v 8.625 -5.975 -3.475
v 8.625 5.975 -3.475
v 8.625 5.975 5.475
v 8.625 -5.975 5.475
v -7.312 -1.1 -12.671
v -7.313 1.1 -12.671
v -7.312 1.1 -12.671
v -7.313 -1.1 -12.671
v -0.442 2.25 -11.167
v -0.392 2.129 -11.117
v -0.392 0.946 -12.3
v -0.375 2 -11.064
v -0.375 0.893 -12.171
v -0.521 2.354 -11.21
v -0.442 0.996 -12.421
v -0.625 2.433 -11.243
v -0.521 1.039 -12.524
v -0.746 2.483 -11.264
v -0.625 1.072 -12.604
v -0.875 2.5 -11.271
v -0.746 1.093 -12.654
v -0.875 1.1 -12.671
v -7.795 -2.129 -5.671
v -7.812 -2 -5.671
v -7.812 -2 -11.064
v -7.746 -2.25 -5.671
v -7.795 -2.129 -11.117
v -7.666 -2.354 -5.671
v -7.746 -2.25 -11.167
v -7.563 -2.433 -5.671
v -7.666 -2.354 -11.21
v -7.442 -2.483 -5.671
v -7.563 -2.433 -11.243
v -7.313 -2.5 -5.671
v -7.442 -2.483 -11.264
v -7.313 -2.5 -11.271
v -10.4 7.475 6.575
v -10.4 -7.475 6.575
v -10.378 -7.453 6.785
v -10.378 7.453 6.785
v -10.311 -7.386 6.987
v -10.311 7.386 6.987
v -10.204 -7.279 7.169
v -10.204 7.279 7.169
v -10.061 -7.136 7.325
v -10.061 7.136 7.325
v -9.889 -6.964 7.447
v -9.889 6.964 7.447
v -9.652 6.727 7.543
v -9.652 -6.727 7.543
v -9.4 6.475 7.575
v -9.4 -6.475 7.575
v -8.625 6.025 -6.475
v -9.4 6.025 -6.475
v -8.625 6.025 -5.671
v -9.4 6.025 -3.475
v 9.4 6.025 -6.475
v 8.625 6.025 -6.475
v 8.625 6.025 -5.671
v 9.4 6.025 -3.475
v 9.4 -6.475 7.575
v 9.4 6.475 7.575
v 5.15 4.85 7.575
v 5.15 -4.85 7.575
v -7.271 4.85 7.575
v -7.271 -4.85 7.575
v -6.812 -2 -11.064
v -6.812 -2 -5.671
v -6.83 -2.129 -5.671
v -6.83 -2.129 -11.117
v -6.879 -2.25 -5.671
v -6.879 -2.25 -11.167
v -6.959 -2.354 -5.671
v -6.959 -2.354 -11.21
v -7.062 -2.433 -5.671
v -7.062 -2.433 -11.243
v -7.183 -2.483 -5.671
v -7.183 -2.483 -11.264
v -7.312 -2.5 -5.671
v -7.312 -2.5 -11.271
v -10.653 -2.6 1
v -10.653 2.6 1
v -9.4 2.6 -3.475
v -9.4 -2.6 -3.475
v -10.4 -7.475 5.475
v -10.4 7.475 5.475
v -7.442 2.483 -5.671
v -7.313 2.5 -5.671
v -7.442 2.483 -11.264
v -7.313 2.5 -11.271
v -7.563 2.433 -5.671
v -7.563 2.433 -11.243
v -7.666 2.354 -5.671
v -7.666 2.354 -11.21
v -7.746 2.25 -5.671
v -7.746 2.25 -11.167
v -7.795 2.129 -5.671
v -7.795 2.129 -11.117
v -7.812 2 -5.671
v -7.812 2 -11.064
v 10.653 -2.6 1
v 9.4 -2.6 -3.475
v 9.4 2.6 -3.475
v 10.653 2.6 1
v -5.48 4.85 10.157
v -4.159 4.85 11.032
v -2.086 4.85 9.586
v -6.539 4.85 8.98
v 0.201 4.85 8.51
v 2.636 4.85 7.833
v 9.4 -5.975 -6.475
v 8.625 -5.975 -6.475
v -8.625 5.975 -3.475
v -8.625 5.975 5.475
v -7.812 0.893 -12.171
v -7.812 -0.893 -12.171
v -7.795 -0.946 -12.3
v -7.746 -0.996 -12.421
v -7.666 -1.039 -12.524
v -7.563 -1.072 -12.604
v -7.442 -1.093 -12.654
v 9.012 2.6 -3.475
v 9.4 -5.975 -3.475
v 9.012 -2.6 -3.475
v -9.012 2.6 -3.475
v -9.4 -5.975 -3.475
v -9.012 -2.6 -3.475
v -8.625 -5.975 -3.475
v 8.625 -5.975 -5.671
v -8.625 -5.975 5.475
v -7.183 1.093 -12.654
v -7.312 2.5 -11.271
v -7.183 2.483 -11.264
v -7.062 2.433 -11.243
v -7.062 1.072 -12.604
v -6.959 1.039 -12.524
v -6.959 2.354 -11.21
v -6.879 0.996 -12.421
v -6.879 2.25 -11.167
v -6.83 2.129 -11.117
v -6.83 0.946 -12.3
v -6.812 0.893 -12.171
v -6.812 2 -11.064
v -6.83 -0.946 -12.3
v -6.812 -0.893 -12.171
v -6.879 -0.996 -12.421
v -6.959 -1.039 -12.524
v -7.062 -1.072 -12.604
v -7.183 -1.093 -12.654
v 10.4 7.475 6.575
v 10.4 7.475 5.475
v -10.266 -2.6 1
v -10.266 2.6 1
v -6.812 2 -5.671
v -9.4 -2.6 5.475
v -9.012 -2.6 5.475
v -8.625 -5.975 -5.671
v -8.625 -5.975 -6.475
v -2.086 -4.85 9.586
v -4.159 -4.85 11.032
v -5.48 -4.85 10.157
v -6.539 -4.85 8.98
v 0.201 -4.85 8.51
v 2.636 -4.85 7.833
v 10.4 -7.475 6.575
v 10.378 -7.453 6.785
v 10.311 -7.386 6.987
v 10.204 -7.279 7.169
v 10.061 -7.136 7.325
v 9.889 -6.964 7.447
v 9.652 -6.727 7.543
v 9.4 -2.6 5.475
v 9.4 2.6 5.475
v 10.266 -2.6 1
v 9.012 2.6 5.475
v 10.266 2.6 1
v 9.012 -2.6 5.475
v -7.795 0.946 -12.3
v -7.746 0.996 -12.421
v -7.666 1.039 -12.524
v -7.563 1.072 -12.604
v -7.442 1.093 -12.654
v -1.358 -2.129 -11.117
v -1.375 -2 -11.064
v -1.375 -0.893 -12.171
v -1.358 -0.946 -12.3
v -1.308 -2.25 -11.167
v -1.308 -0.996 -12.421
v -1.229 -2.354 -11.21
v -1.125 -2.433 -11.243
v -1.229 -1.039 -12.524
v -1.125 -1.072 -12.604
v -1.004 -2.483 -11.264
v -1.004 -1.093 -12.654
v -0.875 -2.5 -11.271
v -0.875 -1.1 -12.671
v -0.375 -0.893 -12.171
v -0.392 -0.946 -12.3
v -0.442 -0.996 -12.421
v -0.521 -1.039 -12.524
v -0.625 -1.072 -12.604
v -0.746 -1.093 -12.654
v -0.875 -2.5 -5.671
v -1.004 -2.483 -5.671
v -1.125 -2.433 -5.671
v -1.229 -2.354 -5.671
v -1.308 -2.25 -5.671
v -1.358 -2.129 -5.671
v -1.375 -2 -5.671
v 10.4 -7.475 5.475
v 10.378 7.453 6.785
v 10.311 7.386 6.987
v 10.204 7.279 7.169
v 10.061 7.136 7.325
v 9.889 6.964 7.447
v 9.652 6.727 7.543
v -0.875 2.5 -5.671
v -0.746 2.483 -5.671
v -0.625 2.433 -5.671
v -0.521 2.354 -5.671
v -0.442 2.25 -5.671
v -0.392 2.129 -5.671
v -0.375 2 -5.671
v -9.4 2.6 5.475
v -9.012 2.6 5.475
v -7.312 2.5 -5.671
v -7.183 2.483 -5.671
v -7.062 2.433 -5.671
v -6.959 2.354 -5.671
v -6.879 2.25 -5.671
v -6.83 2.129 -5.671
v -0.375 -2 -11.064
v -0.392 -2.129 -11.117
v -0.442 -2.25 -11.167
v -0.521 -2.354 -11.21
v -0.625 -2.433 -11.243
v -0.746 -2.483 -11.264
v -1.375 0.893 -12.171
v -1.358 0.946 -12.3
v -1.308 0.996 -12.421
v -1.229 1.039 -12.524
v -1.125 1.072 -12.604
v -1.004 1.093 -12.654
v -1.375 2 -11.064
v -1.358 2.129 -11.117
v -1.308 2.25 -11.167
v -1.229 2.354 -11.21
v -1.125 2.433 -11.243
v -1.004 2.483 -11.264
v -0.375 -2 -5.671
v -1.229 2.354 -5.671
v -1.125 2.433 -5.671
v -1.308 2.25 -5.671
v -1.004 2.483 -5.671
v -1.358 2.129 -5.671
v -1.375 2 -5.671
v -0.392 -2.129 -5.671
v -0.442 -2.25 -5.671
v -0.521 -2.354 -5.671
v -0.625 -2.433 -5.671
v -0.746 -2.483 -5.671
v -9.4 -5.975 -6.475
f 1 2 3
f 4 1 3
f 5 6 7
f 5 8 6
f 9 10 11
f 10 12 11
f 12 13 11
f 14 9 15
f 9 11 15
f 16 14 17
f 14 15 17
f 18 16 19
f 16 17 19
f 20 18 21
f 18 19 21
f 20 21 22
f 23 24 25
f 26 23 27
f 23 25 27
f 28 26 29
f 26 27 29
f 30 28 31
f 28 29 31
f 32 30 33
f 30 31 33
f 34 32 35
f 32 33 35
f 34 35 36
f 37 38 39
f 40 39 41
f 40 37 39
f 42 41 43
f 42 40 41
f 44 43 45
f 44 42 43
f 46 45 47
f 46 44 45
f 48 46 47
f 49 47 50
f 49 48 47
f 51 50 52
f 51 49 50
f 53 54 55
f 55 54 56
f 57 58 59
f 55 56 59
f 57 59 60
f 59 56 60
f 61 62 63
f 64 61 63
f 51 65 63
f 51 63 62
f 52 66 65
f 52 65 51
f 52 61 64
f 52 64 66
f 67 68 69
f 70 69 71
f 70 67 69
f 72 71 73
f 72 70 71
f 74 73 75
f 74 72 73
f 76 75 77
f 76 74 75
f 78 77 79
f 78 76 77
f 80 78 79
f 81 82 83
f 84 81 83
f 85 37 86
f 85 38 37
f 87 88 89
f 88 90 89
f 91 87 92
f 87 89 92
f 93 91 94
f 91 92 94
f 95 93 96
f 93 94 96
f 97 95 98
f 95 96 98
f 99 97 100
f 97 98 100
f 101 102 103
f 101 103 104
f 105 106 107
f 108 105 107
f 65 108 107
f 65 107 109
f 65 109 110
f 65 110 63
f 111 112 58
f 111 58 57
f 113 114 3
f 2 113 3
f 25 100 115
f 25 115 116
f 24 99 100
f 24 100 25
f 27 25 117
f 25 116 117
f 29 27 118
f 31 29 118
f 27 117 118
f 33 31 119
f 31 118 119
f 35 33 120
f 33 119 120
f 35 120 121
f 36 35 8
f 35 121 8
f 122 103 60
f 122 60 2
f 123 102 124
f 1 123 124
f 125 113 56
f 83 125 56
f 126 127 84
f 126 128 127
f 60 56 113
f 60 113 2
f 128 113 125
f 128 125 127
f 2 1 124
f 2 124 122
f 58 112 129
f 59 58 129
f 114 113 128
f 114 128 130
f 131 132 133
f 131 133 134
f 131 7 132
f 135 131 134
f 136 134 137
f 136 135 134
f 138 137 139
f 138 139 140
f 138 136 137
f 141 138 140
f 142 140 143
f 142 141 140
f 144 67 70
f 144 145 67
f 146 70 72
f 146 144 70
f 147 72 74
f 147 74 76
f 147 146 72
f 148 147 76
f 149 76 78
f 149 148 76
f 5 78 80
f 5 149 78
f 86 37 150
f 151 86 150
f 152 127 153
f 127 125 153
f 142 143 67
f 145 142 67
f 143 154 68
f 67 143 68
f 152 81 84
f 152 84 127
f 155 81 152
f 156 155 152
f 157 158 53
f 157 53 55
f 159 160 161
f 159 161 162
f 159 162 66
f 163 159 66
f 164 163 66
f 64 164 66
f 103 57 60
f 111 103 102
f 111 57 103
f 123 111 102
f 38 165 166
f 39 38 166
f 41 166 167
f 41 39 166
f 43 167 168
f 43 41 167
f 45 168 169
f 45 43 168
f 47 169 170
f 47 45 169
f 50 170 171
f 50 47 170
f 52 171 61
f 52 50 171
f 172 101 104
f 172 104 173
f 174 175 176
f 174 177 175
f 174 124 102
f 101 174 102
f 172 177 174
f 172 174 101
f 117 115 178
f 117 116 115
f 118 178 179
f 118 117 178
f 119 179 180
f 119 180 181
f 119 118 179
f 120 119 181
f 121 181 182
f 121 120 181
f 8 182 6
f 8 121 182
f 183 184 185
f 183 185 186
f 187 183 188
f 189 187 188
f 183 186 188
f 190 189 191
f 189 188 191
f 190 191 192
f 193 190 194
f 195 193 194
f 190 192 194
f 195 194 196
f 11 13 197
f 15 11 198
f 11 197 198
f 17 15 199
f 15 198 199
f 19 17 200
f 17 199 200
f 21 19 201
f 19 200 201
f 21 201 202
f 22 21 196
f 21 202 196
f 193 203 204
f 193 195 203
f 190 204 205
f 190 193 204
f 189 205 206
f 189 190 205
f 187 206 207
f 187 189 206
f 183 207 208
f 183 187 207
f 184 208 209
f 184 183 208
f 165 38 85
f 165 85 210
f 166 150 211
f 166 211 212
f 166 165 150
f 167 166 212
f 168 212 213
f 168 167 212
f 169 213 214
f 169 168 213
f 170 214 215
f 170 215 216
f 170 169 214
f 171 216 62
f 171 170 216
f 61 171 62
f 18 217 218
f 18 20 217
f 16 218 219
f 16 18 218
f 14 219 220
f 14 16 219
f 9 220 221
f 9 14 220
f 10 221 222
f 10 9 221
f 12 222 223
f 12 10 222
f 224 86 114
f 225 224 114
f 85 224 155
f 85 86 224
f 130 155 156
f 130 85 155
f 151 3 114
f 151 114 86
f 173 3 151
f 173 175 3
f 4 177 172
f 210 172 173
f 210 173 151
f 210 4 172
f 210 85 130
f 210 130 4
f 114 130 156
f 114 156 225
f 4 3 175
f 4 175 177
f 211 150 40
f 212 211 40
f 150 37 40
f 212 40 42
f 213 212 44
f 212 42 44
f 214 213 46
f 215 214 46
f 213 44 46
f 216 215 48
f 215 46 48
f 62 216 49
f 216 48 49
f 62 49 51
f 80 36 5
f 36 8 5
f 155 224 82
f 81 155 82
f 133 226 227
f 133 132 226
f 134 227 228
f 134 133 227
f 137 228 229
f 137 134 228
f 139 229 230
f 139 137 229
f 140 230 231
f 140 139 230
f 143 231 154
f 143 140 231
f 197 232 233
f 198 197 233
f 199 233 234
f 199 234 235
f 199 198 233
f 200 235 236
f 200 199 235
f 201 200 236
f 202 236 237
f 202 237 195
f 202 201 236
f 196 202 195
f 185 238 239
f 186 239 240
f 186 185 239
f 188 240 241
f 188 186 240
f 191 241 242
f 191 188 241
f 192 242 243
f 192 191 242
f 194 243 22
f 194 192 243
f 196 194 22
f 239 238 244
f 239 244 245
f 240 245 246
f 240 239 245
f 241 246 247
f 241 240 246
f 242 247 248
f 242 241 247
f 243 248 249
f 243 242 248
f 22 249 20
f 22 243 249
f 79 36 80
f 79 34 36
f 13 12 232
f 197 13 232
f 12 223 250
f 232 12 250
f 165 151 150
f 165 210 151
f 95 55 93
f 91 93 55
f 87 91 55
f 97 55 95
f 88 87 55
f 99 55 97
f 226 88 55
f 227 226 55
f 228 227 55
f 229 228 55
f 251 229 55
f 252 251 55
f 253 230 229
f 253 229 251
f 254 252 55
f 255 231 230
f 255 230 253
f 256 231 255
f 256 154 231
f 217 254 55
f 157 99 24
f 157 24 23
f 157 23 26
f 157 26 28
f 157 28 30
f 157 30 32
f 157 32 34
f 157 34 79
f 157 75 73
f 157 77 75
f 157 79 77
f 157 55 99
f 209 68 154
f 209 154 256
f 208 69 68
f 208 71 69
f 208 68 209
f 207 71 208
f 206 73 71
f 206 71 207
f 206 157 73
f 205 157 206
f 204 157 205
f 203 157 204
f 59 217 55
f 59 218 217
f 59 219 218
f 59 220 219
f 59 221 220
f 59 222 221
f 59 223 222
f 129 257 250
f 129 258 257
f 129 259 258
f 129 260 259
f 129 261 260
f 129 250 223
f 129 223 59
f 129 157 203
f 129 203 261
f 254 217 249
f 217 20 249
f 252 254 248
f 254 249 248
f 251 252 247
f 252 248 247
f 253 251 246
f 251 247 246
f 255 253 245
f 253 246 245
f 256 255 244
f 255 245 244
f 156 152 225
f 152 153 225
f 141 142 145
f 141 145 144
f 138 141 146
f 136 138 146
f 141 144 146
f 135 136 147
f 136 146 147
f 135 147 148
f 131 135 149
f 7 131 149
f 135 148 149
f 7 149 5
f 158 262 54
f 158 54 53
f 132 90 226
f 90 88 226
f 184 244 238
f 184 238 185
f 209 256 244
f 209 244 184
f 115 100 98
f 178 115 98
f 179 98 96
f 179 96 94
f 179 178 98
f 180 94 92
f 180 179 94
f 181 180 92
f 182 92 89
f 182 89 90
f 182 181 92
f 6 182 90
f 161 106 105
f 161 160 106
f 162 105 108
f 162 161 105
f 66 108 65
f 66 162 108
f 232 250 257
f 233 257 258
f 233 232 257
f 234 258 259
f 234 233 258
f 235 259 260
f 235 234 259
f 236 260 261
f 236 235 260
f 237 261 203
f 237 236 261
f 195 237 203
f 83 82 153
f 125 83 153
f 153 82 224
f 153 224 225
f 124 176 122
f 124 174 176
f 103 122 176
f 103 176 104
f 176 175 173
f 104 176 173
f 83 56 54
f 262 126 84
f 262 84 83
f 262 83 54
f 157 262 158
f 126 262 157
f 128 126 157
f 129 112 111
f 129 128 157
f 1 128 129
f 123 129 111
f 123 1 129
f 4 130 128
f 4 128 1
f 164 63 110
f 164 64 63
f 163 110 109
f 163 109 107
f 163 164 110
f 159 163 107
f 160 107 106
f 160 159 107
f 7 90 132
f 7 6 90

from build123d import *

# Parameters (mm, degrees)
F0_W      = 17.25
F0_H      = 10.95
F1_DEPTH  = 5.975
F3_DEPTH  = 12
F4_W      = 17.25
F4_H      = 0.8041968666
F5_DEPTH  = 12.001
F7_DEPTH  = 2.6
F9_DEPTH  = 7.475
F10_W     = 1
F10_H     = 5
F11_DEPTH = 7
F12_SIZE  = 1.4
F13_R     = 0.49999
F14_R     = 1
F16_DEPTH = 4.85


# Not quite as in the source:
# - a fillet or chamfer is up to 0.001 mm smaller than in the source, because OpenCascade refuses the exact size


with BuildPart() as f1:
    # F0 (on Front) → F1 (new body, symmetric)
    with BuildSketch(Plane.XZ):
        Rectangle(F0_W, F0_H)
    extrude(amount=F1_DEPTH, both=True)

    # F2 (on face) → F3 (join)
    with BuildSketch(Plane.XZ.offset(5.975)):
        Polygon((-8.625, -5.475), (8.625, -5.475), (8.625, -3.475), (0, -3.475), (-8.625, -3.475), align=None)
        Polygon((8.625, -3.475), (8.625, -5.475), (-8.625, -5.475), (-8.625, -3.475), (-9.4, -3.475), (-9.4, -6.475), (0, -6.475), (9.4, -6.475), (9.4, -3.475), align=None)
    extrude(amount=-F3_DEPTH)

    # F4 (on face) → F5 (cut, through all)
    with BuildSketch(Plane.XZ.offset(5.975)):
        with Locations((0, -6.0729015667)):
            Rectangle(F4_W, F4_H)
    extrude(amount=-F5_DEPTH, mode=Mode.SUBTRACT)

    # F6 (on Front) → F7 (join, symmetric)
    with BuildSketch(Plane.XZ):
        Polygon((-10.653115809, 1), (-9.4, -3.475), (-9.0125, -3.475), (-10.265615809, 1), (-9.0125, 5.475), (-9.4, 5.475), align=None)
        Polygon((10.265615809, 1), (9.0125, -3.475), (9.4, -3.475), (10.653115809, 1), (9.4, 5.475), (9.0125, 5.475), align=None)
    extrude(amount=F7_DEPTH, both=True)

    # F8 (on Front) → F9 (join, symmetric)
    with BuildSketch(Plane.XZ):
        Polygon((-10.4, 5.475), (-8.625, 5.475), (8.625, 5.475), (10.4, 5.475), (10.4, 7.575), (-10.4, 7.575), align=None)
    extrude(amount=F9_DEPTH, both=True)

    # F10 (on face) → F11 (join)
    with BuildSketch(Plane(origin=(0, 0, -5.6708031334), x_dir=(1, 0, 0), z_dir=(0, 0, -1))):
        with Locations((-7.3124970421, 0)):
            Rectangle(F10_W, F10_H)
        with Locations((-0.875, 0)):
            Rectangle(F10_W, F10_H)
    extrude(amount=F11_DEPTH)

    # F12
    f12_edges = [f1.edges().sort_by_distance(p)[0] for p in [
        (-7.312497, -2.5, -12.670803),
        (-7.312497, 2.5, -12.670803),
        (-0.875, -2.5, -12.670803),
        (-0.875, 2.5, -12.670803),
    ]]
    chamfer(f12_edges, length=F12_SIZE)

    # F13 (radius 0.5 in the source; OpenCascade refuses exactly that, so slightly less here)
    f13_edges = [f1.edges().sort_by_distance(p)[0] for p in [
        (-6.812497, -2.5, -8.470803),
        (-7.812497, -2.5, -8.470803),
        (-6.812497, -1.8, -11.970803),
        (-7.812497, -1.8, -11.970803),
        (-6.812497, 0, -12.670803),
        (-7.812497, 0, -12.670803),
        (-6.812497, 1.8, -11.970803),
        (-7.812497, 1.8, -11.970803),
        (-6.812497, 2.5, -8.470803),
        (-7.812497, 2.5, -8.470803),
        (-0.375, 2.5, -8.470803),
        (-1.375, 2.5, -8.470803),
        (-0.375, 1.8, -11.970803),
        (-1.375, 1.8, -11.970803),
        (-0.375, 0, -12.670803),
        (-1.375, 0, -12.670803),
        (-0.375, -1.8, -11.970803),
        (-1.375, -1.8, -11.970803),
        (-0.375, -2.5, -8.470803),
        (-1.375, -2.5, -8.470803),
    ]]
    fillet(f13_edges, radius=F13_R)

    # F14
    f14_edges = [f1.edges().sort_by_distance(p)[0] for p in [
        (0, -7.475, 7.575),
        (10.4, 0, 7.575),
        (0, 7.475, 7.575),
        (-10.4, 0, 7.575),
    ]]
    fillet(f14_edges, radius=F14_R)

    # F15 (on Front) → F16 (join, symmetric)
    with BuildSketch(Plane.XZ):
        with BuildLine():
            ThreePointArc((-4.1594156064, 11.0315568745), (-6.0465979045, 9.6017056311), (-7.2706877254, 7.575))
            Line((-7.2706877254, 7.575), (5.1499965846, 7.575))
            ThreePointArc((5.1499965846, 7.575), (0.2006102654, 8.5096274816), (-4.1594156064, 11.0315568745))
        make_face()
    extrude(amount=F16_DEPTH, both=True)


solid = f1.part
